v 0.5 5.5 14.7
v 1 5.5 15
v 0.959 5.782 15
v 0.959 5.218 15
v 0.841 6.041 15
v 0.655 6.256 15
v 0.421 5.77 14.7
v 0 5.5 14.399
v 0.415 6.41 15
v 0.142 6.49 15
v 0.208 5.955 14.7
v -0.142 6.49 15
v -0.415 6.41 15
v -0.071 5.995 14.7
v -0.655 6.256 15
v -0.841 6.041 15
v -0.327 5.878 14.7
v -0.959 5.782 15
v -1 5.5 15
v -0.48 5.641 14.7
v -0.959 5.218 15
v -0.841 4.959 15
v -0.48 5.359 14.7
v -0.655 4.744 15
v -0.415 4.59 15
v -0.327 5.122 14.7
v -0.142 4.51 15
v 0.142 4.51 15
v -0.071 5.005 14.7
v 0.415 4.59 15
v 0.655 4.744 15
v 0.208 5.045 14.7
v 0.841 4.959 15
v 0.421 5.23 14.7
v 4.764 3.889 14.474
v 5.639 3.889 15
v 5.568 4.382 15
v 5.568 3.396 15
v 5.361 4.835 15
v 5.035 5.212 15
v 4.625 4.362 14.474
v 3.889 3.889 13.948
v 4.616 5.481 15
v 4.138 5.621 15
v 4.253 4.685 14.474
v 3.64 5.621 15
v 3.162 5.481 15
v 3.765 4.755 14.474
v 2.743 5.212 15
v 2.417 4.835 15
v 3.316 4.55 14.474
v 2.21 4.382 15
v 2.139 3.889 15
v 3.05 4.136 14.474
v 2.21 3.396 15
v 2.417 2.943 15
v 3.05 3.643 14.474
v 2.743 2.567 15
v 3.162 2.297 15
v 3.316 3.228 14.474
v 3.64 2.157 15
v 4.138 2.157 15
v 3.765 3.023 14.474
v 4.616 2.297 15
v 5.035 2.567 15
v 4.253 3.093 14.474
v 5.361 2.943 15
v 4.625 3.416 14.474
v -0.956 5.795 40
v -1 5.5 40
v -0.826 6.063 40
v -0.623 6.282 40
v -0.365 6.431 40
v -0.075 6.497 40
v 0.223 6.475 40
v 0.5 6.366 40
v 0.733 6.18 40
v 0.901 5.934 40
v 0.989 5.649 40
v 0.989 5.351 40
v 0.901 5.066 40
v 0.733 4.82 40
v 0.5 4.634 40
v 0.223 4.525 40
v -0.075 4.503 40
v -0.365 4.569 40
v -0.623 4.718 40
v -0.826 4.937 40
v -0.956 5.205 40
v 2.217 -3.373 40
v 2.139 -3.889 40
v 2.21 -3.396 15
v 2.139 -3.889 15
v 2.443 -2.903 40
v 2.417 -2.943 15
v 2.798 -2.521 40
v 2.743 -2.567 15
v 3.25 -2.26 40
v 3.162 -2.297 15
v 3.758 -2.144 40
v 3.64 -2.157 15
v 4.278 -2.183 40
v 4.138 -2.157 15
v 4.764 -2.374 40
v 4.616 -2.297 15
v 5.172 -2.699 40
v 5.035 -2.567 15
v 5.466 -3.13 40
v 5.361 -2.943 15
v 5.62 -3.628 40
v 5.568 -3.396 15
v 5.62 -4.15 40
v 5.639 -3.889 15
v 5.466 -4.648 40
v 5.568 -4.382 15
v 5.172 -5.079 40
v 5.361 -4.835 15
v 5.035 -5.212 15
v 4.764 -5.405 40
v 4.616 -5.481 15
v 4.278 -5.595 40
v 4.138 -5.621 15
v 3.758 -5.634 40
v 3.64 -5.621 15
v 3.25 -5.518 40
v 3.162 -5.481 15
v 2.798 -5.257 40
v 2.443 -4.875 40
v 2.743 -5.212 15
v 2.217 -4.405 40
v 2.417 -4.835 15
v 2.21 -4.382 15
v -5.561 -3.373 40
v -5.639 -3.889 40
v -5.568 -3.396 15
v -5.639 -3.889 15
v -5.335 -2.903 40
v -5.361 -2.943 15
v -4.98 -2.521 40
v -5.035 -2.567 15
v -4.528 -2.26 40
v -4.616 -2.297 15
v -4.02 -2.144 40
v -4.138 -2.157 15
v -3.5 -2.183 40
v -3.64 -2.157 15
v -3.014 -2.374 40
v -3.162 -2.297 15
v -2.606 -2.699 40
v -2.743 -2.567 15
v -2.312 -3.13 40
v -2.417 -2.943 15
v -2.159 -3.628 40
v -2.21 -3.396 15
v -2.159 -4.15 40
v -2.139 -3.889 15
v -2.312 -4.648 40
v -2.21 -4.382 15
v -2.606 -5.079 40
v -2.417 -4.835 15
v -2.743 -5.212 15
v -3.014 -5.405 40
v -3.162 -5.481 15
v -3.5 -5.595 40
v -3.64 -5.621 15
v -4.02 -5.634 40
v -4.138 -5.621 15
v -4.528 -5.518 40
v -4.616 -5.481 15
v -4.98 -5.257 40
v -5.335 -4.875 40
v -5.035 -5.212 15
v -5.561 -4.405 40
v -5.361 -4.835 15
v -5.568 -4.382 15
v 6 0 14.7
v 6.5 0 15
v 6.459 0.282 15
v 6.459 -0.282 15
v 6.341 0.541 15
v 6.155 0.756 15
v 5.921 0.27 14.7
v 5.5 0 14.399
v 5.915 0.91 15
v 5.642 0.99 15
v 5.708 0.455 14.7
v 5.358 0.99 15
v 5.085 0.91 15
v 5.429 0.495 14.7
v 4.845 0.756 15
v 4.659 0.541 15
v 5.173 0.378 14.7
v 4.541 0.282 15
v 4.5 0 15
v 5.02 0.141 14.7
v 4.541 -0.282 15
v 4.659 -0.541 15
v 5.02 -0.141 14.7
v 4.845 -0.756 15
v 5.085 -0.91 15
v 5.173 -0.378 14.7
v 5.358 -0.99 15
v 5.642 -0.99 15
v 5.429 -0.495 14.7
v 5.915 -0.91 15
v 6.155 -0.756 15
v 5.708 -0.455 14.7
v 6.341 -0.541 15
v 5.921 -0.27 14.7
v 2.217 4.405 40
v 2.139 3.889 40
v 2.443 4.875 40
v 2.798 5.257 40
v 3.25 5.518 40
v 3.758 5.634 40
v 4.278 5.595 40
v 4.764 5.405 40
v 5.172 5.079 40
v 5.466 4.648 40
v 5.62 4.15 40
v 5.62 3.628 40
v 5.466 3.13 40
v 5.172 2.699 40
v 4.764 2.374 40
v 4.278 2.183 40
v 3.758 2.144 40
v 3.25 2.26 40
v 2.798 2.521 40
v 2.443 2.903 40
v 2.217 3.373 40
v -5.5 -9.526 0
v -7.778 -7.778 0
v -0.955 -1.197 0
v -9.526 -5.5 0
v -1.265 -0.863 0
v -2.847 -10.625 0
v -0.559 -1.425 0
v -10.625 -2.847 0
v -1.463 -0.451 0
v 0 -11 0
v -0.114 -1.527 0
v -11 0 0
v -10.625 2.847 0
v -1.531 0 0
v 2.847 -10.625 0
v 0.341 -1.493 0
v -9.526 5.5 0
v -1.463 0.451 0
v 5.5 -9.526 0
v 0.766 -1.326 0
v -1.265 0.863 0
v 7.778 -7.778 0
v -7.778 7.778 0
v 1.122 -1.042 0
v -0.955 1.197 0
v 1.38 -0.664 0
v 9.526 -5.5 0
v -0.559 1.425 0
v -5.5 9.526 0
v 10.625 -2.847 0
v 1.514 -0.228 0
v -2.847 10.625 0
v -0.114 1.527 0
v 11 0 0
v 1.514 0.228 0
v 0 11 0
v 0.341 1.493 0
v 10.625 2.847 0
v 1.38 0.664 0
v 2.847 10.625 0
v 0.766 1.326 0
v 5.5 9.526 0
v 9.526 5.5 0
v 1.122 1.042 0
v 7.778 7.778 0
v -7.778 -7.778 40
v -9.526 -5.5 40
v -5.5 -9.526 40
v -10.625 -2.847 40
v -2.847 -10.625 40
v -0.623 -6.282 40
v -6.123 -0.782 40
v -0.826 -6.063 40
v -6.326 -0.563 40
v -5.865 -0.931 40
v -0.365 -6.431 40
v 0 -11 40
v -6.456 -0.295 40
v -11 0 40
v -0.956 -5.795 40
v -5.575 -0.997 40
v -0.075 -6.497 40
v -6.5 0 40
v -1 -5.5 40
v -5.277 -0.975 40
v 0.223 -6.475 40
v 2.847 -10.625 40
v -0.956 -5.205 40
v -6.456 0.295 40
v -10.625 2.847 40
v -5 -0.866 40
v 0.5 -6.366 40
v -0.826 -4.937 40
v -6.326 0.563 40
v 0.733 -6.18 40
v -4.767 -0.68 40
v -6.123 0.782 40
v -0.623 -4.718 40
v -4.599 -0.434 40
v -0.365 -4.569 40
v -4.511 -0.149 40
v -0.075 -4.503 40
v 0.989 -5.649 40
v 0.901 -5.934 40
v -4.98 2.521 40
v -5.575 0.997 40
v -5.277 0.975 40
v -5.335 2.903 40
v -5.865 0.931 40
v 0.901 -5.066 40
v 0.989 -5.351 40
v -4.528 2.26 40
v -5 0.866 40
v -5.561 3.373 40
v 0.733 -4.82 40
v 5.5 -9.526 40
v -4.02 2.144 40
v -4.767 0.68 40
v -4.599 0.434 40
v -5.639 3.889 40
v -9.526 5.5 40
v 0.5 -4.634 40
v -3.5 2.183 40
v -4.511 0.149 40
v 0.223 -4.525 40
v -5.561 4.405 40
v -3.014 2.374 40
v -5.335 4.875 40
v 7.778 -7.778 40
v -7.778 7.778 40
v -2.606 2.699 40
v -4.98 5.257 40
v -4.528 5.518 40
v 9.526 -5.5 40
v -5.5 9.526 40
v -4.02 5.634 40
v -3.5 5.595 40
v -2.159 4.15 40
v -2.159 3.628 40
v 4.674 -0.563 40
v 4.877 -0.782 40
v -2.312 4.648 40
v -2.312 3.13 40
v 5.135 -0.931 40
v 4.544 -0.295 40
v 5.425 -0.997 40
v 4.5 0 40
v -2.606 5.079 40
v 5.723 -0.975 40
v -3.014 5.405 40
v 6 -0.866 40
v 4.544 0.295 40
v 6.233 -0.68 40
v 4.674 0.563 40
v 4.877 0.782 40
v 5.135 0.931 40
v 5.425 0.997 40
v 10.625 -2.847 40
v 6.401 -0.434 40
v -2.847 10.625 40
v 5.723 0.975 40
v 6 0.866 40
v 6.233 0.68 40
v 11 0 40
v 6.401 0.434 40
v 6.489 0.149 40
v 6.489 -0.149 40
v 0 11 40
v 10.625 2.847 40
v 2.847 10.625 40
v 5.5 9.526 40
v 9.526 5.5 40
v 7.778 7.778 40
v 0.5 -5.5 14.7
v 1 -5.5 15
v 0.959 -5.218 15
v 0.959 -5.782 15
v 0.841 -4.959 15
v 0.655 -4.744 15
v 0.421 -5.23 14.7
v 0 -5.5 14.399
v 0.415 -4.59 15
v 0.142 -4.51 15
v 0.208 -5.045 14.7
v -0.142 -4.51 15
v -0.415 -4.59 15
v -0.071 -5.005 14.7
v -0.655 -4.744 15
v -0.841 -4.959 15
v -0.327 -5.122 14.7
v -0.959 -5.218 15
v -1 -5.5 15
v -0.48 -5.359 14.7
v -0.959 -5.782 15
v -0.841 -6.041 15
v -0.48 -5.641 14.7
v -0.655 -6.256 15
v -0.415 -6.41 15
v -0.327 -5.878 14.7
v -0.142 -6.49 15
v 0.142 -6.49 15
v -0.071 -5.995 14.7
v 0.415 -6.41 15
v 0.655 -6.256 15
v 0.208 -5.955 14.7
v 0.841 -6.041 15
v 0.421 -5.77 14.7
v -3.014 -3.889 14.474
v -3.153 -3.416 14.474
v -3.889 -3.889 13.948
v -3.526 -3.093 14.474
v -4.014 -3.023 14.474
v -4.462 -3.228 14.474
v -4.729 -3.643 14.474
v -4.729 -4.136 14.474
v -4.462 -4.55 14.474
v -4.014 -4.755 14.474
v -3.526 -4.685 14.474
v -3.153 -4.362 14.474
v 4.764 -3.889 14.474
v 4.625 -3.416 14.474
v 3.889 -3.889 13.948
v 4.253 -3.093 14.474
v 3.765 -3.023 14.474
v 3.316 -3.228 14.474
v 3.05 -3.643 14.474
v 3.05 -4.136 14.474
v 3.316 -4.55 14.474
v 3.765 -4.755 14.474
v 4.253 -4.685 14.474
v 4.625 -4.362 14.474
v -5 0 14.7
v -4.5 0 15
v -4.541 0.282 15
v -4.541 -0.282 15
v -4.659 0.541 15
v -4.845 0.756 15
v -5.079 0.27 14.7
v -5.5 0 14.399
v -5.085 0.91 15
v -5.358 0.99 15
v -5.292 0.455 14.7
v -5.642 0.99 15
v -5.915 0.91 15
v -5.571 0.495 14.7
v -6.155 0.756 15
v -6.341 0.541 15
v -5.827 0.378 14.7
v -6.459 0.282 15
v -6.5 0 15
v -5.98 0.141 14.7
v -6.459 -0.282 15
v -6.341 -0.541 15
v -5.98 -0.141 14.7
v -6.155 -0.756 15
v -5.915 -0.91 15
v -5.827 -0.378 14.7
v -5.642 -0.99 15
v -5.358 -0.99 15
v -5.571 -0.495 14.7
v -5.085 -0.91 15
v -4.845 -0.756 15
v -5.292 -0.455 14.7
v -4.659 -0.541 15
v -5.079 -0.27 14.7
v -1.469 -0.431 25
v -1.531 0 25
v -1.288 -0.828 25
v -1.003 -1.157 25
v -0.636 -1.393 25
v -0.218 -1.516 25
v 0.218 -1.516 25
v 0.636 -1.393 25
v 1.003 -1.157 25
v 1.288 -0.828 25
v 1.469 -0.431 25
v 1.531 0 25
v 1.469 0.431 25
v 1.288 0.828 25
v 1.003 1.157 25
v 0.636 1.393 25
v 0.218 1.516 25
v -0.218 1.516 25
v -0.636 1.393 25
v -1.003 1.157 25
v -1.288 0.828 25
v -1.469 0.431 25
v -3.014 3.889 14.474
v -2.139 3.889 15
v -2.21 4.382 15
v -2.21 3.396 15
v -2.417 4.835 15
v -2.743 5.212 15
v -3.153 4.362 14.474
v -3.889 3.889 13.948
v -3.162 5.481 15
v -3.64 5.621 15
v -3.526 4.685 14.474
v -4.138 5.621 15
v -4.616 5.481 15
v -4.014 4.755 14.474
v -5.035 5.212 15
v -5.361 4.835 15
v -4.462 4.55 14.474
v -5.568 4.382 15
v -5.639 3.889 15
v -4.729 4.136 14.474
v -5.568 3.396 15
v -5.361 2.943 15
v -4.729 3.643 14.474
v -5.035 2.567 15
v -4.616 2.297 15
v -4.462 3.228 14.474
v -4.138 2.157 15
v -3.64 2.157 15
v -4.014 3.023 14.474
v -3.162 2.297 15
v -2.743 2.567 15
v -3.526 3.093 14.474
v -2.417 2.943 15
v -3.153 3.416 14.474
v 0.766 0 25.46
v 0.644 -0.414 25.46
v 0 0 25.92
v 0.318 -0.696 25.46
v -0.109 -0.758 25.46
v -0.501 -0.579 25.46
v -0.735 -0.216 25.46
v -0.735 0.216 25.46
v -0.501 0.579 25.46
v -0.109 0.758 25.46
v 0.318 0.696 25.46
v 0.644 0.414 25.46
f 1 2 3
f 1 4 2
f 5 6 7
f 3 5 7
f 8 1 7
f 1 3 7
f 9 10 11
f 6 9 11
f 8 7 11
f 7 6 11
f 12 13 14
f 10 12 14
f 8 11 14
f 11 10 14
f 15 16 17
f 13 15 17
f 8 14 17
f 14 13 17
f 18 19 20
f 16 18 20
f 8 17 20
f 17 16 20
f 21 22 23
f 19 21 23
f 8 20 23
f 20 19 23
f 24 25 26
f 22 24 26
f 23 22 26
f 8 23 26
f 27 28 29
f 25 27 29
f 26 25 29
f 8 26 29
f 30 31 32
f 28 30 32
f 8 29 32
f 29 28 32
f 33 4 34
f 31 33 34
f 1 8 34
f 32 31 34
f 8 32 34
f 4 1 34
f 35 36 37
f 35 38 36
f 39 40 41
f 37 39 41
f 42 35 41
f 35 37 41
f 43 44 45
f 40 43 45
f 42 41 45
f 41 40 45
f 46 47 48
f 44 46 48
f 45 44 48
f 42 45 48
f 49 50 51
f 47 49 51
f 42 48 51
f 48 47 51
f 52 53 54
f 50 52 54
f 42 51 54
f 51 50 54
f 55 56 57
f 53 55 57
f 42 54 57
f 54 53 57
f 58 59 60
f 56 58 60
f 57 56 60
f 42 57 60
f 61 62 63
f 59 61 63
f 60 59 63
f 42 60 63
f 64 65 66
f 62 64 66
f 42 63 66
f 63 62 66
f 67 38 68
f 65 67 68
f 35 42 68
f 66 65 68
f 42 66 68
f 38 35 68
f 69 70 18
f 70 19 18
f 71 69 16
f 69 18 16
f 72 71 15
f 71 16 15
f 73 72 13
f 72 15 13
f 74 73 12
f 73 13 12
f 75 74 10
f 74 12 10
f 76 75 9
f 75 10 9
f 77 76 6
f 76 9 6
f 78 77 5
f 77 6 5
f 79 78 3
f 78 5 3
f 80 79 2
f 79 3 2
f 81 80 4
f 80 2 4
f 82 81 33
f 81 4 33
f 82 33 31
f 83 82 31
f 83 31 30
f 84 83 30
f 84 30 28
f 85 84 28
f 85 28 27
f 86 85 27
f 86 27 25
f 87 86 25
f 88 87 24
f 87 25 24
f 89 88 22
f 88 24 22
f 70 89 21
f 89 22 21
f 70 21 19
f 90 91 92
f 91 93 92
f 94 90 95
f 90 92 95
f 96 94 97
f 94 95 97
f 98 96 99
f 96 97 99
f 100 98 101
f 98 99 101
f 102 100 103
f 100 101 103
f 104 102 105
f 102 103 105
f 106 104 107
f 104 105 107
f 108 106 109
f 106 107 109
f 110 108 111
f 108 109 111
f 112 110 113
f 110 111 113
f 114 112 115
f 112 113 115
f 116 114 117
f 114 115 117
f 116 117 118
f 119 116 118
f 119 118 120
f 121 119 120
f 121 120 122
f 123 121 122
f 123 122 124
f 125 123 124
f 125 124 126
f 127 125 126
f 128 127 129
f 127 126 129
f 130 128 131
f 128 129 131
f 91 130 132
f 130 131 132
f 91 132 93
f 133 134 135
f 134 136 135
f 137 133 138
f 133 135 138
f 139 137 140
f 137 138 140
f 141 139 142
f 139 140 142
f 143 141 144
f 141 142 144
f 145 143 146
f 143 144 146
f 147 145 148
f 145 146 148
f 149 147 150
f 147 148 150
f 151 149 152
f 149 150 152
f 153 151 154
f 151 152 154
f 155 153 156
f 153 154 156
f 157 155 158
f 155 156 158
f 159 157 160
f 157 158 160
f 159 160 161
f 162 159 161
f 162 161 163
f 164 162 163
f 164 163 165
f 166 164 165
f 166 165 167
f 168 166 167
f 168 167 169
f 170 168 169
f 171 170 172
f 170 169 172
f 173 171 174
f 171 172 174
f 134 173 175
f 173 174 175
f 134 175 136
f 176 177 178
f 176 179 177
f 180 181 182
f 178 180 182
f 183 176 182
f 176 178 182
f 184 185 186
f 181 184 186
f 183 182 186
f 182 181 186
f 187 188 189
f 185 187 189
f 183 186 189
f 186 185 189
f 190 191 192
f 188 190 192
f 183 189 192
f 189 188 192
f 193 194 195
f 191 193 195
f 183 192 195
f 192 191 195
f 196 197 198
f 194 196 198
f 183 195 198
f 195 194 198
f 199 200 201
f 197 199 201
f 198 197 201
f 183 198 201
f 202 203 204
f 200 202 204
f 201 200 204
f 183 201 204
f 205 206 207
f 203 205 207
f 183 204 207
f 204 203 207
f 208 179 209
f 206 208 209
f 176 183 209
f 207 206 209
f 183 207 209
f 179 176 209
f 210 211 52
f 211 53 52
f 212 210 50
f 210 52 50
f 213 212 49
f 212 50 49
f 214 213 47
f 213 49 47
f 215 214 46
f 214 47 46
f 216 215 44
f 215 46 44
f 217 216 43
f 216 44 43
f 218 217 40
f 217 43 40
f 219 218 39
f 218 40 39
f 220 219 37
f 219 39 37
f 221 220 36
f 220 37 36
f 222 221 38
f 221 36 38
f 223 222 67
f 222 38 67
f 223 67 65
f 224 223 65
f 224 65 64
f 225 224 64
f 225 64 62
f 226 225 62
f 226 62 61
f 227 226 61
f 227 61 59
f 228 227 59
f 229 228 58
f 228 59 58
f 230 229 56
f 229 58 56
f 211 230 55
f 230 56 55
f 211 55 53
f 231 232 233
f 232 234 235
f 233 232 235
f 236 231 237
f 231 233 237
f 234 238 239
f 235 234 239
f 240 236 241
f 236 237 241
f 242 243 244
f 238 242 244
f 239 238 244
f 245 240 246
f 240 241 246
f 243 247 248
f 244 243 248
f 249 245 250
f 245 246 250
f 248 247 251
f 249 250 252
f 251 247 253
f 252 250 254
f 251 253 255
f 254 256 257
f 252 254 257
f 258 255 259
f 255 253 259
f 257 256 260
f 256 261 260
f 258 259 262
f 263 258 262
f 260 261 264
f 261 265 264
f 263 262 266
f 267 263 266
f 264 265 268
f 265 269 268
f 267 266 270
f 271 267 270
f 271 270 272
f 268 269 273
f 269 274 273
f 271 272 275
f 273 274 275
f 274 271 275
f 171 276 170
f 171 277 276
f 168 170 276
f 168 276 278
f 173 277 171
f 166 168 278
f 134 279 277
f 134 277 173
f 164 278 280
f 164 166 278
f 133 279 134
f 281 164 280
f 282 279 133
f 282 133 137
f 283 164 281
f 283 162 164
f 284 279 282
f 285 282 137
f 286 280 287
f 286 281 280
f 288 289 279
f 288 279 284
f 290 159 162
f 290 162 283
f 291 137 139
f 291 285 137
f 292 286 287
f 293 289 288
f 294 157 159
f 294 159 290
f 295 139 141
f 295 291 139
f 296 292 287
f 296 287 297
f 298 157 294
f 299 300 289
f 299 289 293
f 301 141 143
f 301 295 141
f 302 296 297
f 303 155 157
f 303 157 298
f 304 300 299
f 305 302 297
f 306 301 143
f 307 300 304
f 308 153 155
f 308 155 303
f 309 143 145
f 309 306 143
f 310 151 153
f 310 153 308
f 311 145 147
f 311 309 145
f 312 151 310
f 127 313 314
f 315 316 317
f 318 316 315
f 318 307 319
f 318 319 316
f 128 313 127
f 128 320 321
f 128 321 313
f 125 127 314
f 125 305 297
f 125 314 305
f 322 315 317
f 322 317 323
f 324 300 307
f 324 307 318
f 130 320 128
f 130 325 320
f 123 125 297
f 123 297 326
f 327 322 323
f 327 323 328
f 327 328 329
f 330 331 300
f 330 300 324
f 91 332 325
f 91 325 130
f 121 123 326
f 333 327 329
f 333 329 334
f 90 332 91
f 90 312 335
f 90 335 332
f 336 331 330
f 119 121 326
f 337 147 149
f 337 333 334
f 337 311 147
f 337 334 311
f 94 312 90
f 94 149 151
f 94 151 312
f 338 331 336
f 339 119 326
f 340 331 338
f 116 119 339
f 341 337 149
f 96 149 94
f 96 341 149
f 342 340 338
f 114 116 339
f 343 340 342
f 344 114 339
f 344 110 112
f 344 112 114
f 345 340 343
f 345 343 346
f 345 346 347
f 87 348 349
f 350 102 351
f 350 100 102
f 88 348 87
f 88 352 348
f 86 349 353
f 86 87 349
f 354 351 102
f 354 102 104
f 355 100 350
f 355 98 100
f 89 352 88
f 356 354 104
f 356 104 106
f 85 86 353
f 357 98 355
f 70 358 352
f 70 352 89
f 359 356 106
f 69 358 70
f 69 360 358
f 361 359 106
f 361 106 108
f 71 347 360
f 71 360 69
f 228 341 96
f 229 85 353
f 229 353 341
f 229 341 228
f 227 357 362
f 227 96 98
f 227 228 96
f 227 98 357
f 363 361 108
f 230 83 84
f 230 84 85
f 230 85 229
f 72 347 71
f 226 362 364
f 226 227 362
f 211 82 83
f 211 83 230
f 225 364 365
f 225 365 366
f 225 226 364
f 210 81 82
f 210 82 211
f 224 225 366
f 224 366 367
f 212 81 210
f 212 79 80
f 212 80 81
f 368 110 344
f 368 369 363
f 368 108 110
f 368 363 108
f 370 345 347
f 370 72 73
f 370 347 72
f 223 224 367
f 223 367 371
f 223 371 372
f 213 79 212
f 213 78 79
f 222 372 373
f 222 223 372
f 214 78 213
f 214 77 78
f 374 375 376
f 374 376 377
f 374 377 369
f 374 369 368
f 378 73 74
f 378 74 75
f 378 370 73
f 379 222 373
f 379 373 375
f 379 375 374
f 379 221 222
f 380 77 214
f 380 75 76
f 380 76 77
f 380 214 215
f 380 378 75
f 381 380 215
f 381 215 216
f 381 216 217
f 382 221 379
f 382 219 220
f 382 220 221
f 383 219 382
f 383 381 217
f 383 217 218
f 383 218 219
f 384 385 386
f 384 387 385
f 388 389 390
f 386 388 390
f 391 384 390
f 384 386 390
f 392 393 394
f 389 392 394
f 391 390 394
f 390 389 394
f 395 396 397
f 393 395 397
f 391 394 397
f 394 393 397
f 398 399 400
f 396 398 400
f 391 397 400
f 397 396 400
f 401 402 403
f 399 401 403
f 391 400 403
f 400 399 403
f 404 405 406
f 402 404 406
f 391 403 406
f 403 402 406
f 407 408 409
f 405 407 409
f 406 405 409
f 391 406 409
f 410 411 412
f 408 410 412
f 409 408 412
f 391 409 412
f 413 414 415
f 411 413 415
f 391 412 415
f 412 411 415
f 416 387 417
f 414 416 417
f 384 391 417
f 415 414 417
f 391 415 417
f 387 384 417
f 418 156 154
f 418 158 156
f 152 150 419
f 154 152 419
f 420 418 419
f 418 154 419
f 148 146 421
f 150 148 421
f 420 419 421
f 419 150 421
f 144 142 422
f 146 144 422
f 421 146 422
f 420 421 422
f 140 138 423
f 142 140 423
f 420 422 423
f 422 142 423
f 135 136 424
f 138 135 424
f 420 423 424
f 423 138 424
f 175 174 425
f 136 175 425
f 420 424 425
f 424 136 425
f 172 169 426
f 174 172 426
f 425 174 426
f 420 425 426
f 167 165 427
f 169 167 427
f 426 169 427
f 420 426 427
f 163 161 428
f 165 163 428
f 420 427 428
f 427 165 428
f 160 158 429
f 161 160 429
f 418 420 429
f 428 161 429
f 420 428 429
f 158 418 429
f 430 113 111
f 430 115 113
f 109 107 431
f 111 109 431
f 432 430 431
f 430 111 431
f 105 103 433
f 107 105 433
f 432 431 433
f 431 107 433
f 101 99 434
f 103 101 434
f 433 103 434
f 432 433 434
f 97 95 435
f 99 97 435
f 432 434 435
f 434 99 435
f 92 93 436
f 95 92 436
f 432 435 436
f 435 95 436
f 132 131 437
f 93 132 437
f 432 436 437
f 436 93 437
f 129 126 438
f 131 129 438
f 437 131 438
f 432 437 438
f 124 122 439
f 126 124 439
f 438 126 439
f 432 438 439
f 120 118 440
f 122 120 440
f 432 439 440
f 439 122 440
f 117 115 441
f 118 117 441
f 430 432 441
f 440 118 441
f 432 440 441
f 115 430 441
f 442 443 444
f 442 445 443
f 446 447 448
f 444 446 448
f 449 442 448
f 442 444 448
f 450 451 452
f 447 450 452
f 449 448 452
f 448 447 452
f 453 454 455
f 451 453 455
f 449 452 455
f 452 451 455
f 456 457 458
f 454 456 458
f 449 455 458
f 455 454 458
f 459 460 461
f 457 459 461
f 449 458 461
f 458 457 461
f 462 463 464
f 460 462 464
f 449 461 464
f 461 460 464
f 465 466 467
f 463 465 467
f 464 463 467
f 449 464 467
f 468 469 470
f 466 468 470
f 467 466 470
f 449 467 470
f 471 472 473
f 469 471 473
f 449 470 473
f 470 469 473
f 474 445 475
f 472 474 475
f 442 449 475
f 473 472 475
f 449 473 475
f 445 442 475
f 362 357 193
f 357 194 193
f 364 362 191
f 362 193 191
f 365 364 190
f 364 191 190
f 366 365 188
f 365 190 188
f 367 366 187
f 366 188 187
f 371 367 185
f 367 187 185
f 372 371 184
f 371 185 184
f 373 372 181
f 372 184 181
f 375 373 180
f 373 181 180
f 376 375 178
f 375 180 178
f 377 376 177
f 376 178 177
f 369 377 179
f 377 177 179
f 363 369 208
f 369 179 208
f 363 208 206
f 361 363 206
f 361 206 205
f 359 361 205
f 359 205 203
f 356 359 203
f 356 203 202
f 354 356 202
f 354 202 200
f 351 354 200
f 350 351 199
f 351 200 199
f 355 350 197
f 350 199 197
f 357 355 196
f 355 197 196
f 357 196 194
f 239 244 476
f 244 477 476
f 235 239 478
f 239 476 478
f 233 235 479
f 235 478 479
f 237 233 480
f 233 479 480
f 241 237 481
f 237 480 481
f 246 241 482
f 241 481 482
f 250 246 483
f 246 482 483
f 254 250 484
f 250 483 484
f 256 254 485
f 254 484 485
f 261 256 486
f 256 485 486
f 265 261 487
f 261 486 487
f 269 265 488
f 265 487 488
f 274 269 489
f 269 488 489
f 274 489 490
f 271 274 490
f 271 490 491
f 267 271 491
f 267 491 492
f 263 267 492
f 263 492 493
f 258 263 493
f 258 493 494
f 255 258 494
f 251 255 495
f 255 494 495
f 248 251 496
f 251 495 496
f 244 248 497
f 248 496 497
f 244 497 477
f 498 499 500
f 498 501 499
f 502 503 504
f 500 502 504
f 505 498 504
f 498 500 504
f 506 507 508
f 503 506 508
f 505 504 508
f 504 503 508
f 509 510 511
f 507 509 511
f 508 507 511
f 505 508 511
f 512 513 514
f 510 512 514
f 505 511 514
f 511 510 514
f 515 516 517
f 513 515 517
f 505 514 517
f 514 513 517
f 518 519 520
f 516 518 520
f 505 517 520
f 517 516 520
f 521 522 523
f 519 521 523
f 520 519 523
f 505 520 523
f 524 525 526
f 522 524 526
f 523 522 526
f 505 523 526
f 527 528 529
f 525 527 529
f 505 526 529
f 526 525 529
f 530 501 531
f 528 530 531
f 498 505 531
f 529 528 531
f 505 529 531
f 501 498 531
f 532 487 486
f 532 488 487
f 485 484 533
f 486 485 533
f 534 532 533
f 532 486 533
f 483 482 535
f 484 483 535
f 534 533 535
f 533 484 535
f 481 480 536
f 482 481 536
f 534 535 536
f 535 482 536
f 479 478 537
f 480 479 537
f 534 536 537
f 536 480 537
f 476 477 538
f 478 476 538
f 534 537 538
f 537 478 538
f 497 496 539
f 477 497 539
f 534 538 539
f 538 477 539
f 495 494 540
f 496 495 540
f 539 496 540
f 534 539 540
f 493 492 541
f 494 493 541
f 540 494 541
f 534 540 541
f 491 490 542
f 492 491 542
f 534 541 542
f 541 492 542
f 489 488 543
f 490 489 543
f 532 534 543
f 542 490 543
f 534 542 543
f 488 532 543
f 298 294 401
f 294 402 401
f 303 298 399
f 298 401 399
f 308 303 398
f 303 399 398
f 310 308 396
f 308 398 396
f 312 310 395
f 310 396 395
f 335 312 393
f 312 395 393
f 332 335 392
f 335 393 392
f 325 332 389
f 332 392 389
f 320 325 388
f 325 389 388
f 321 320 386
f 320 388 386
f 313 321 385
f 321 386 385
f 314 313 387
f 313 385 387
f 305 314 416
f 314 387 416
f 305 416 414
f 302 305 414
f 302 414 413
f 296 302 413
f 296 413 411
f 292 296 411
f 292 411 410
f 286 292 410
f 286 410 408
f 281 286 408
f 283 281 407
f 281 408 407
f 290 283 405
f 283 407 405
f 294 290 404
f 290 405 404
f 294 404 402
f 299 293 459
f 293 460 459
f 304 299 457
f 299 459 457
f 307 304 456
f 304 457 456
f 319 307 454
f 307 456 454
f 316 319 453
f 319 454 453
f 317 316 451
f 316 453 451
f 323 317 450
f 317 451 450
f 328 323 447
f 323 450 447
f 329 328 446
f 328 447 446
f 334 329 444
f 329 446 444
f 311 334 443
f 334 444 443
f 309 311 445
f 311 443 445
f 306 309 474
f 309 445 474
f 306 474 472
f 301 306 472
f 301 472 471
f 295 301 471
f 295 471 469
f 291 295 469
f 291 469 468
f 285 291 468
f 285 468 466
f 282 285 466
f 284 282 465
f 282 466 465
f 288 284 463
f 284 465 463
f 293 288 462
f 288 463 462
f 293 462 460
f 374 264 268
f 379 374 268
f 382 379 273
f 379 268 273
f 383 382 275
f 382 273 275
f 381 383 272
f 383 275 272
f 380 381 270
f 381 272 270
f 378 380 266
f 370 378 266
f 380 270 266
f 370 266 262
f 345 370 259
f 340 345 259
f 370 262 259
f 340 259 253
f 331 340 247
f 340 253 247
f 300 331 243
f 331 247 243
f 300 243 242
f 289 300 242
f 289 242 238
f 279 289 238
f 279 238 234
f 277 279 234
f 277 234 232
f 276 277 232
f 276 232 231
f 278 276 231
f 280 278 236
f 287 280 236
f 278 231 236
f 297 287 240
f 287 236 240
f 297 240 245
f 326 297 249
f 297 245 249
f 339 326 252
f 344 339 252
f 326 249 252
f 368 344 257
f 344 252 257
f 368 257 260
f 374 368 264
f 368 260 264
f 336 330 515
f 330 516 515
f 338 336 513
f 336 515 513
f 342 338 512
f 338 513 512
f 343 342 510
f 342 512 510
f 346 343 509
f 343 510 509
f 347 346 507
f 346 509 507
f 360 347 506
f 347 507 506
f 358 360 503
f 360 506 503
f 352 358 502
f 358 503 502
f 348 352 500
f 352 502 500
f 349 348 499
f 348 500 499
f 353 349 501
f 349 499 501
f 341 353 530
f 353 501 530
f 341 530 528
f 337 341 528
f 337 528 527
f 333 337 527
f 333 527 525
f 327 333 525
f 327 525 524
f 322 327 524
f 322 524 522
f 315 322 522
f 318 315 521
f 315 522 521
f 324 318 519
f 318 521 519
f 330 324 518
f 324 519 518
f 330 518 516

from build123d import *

# Parameters (mm, degrees)
F0_R     = 11
F1_DEPTH = 40
F3_D     = 3.0625
F3_DEPTH = 25
F3_TIP   = 0.9200678229
F5_D     = 2
F5_DEPTH = 25
F5_TIP   = 0.600860619
F7_D     = 3.5
F7_DEPTH = 25
F7_TIP   = 1.0515060833


with BuildPart() as f1:
    # F0 (on Top) → F1 (new body)
    with BuildSketch(Plane.XY):
        Circle(F0_R)
    extrude(amount=F1_DEPTH)

    # F3
    with Locations(Plane(origin=(0, 0, 0), x_dir=(1, 0, 0), z_dir=(0, 0, -1))):
        with Locations((0, 0)):
            Hole(F3_D / 2, depth=F3_DEPTH)
            with Locations((0, 0, -(F3_DEPTH + F3_TIP / 2))):  # 118° drill point
                Cone(0, F3_D / 2, F3_TIP, mode=Mode.SUBTRACT)

    # F5
    with Locations(Plane.XY.offset(40)):
        with Locations((0, 5.5), (5.5, 0), (-5.5, 0), (0, -5.5)):
            Hole(F5_D / 2, depth=F5_DEPTH)
            with Locations((0, 0, -(F5_DEPTH + F5_TIP / 2))):  # 118° drill point
                Cone(0, F5_D / 2, F5_TIP, mode=Mode.SUBTRACT)

    # F7
    with Locations(Plane.XY.offset(40)):
        with Locations((-3.8890872965, 3.8890872965), (3.8890872965, 3.8890872965), (3.8890872965, -3.8890872965), (-3.8890872965, -3.8890872965)):
            Hole(F7_D / 2, depth=F7_DEPTH)
            with Locations((0, 0, -(F7_DEPTH + F7_TIP / 2))):  # 118° drill point
                Cone(0, F7_D / 2, F7_TIP, mode=Mode.SUBTRACT)


solid = f1.part
